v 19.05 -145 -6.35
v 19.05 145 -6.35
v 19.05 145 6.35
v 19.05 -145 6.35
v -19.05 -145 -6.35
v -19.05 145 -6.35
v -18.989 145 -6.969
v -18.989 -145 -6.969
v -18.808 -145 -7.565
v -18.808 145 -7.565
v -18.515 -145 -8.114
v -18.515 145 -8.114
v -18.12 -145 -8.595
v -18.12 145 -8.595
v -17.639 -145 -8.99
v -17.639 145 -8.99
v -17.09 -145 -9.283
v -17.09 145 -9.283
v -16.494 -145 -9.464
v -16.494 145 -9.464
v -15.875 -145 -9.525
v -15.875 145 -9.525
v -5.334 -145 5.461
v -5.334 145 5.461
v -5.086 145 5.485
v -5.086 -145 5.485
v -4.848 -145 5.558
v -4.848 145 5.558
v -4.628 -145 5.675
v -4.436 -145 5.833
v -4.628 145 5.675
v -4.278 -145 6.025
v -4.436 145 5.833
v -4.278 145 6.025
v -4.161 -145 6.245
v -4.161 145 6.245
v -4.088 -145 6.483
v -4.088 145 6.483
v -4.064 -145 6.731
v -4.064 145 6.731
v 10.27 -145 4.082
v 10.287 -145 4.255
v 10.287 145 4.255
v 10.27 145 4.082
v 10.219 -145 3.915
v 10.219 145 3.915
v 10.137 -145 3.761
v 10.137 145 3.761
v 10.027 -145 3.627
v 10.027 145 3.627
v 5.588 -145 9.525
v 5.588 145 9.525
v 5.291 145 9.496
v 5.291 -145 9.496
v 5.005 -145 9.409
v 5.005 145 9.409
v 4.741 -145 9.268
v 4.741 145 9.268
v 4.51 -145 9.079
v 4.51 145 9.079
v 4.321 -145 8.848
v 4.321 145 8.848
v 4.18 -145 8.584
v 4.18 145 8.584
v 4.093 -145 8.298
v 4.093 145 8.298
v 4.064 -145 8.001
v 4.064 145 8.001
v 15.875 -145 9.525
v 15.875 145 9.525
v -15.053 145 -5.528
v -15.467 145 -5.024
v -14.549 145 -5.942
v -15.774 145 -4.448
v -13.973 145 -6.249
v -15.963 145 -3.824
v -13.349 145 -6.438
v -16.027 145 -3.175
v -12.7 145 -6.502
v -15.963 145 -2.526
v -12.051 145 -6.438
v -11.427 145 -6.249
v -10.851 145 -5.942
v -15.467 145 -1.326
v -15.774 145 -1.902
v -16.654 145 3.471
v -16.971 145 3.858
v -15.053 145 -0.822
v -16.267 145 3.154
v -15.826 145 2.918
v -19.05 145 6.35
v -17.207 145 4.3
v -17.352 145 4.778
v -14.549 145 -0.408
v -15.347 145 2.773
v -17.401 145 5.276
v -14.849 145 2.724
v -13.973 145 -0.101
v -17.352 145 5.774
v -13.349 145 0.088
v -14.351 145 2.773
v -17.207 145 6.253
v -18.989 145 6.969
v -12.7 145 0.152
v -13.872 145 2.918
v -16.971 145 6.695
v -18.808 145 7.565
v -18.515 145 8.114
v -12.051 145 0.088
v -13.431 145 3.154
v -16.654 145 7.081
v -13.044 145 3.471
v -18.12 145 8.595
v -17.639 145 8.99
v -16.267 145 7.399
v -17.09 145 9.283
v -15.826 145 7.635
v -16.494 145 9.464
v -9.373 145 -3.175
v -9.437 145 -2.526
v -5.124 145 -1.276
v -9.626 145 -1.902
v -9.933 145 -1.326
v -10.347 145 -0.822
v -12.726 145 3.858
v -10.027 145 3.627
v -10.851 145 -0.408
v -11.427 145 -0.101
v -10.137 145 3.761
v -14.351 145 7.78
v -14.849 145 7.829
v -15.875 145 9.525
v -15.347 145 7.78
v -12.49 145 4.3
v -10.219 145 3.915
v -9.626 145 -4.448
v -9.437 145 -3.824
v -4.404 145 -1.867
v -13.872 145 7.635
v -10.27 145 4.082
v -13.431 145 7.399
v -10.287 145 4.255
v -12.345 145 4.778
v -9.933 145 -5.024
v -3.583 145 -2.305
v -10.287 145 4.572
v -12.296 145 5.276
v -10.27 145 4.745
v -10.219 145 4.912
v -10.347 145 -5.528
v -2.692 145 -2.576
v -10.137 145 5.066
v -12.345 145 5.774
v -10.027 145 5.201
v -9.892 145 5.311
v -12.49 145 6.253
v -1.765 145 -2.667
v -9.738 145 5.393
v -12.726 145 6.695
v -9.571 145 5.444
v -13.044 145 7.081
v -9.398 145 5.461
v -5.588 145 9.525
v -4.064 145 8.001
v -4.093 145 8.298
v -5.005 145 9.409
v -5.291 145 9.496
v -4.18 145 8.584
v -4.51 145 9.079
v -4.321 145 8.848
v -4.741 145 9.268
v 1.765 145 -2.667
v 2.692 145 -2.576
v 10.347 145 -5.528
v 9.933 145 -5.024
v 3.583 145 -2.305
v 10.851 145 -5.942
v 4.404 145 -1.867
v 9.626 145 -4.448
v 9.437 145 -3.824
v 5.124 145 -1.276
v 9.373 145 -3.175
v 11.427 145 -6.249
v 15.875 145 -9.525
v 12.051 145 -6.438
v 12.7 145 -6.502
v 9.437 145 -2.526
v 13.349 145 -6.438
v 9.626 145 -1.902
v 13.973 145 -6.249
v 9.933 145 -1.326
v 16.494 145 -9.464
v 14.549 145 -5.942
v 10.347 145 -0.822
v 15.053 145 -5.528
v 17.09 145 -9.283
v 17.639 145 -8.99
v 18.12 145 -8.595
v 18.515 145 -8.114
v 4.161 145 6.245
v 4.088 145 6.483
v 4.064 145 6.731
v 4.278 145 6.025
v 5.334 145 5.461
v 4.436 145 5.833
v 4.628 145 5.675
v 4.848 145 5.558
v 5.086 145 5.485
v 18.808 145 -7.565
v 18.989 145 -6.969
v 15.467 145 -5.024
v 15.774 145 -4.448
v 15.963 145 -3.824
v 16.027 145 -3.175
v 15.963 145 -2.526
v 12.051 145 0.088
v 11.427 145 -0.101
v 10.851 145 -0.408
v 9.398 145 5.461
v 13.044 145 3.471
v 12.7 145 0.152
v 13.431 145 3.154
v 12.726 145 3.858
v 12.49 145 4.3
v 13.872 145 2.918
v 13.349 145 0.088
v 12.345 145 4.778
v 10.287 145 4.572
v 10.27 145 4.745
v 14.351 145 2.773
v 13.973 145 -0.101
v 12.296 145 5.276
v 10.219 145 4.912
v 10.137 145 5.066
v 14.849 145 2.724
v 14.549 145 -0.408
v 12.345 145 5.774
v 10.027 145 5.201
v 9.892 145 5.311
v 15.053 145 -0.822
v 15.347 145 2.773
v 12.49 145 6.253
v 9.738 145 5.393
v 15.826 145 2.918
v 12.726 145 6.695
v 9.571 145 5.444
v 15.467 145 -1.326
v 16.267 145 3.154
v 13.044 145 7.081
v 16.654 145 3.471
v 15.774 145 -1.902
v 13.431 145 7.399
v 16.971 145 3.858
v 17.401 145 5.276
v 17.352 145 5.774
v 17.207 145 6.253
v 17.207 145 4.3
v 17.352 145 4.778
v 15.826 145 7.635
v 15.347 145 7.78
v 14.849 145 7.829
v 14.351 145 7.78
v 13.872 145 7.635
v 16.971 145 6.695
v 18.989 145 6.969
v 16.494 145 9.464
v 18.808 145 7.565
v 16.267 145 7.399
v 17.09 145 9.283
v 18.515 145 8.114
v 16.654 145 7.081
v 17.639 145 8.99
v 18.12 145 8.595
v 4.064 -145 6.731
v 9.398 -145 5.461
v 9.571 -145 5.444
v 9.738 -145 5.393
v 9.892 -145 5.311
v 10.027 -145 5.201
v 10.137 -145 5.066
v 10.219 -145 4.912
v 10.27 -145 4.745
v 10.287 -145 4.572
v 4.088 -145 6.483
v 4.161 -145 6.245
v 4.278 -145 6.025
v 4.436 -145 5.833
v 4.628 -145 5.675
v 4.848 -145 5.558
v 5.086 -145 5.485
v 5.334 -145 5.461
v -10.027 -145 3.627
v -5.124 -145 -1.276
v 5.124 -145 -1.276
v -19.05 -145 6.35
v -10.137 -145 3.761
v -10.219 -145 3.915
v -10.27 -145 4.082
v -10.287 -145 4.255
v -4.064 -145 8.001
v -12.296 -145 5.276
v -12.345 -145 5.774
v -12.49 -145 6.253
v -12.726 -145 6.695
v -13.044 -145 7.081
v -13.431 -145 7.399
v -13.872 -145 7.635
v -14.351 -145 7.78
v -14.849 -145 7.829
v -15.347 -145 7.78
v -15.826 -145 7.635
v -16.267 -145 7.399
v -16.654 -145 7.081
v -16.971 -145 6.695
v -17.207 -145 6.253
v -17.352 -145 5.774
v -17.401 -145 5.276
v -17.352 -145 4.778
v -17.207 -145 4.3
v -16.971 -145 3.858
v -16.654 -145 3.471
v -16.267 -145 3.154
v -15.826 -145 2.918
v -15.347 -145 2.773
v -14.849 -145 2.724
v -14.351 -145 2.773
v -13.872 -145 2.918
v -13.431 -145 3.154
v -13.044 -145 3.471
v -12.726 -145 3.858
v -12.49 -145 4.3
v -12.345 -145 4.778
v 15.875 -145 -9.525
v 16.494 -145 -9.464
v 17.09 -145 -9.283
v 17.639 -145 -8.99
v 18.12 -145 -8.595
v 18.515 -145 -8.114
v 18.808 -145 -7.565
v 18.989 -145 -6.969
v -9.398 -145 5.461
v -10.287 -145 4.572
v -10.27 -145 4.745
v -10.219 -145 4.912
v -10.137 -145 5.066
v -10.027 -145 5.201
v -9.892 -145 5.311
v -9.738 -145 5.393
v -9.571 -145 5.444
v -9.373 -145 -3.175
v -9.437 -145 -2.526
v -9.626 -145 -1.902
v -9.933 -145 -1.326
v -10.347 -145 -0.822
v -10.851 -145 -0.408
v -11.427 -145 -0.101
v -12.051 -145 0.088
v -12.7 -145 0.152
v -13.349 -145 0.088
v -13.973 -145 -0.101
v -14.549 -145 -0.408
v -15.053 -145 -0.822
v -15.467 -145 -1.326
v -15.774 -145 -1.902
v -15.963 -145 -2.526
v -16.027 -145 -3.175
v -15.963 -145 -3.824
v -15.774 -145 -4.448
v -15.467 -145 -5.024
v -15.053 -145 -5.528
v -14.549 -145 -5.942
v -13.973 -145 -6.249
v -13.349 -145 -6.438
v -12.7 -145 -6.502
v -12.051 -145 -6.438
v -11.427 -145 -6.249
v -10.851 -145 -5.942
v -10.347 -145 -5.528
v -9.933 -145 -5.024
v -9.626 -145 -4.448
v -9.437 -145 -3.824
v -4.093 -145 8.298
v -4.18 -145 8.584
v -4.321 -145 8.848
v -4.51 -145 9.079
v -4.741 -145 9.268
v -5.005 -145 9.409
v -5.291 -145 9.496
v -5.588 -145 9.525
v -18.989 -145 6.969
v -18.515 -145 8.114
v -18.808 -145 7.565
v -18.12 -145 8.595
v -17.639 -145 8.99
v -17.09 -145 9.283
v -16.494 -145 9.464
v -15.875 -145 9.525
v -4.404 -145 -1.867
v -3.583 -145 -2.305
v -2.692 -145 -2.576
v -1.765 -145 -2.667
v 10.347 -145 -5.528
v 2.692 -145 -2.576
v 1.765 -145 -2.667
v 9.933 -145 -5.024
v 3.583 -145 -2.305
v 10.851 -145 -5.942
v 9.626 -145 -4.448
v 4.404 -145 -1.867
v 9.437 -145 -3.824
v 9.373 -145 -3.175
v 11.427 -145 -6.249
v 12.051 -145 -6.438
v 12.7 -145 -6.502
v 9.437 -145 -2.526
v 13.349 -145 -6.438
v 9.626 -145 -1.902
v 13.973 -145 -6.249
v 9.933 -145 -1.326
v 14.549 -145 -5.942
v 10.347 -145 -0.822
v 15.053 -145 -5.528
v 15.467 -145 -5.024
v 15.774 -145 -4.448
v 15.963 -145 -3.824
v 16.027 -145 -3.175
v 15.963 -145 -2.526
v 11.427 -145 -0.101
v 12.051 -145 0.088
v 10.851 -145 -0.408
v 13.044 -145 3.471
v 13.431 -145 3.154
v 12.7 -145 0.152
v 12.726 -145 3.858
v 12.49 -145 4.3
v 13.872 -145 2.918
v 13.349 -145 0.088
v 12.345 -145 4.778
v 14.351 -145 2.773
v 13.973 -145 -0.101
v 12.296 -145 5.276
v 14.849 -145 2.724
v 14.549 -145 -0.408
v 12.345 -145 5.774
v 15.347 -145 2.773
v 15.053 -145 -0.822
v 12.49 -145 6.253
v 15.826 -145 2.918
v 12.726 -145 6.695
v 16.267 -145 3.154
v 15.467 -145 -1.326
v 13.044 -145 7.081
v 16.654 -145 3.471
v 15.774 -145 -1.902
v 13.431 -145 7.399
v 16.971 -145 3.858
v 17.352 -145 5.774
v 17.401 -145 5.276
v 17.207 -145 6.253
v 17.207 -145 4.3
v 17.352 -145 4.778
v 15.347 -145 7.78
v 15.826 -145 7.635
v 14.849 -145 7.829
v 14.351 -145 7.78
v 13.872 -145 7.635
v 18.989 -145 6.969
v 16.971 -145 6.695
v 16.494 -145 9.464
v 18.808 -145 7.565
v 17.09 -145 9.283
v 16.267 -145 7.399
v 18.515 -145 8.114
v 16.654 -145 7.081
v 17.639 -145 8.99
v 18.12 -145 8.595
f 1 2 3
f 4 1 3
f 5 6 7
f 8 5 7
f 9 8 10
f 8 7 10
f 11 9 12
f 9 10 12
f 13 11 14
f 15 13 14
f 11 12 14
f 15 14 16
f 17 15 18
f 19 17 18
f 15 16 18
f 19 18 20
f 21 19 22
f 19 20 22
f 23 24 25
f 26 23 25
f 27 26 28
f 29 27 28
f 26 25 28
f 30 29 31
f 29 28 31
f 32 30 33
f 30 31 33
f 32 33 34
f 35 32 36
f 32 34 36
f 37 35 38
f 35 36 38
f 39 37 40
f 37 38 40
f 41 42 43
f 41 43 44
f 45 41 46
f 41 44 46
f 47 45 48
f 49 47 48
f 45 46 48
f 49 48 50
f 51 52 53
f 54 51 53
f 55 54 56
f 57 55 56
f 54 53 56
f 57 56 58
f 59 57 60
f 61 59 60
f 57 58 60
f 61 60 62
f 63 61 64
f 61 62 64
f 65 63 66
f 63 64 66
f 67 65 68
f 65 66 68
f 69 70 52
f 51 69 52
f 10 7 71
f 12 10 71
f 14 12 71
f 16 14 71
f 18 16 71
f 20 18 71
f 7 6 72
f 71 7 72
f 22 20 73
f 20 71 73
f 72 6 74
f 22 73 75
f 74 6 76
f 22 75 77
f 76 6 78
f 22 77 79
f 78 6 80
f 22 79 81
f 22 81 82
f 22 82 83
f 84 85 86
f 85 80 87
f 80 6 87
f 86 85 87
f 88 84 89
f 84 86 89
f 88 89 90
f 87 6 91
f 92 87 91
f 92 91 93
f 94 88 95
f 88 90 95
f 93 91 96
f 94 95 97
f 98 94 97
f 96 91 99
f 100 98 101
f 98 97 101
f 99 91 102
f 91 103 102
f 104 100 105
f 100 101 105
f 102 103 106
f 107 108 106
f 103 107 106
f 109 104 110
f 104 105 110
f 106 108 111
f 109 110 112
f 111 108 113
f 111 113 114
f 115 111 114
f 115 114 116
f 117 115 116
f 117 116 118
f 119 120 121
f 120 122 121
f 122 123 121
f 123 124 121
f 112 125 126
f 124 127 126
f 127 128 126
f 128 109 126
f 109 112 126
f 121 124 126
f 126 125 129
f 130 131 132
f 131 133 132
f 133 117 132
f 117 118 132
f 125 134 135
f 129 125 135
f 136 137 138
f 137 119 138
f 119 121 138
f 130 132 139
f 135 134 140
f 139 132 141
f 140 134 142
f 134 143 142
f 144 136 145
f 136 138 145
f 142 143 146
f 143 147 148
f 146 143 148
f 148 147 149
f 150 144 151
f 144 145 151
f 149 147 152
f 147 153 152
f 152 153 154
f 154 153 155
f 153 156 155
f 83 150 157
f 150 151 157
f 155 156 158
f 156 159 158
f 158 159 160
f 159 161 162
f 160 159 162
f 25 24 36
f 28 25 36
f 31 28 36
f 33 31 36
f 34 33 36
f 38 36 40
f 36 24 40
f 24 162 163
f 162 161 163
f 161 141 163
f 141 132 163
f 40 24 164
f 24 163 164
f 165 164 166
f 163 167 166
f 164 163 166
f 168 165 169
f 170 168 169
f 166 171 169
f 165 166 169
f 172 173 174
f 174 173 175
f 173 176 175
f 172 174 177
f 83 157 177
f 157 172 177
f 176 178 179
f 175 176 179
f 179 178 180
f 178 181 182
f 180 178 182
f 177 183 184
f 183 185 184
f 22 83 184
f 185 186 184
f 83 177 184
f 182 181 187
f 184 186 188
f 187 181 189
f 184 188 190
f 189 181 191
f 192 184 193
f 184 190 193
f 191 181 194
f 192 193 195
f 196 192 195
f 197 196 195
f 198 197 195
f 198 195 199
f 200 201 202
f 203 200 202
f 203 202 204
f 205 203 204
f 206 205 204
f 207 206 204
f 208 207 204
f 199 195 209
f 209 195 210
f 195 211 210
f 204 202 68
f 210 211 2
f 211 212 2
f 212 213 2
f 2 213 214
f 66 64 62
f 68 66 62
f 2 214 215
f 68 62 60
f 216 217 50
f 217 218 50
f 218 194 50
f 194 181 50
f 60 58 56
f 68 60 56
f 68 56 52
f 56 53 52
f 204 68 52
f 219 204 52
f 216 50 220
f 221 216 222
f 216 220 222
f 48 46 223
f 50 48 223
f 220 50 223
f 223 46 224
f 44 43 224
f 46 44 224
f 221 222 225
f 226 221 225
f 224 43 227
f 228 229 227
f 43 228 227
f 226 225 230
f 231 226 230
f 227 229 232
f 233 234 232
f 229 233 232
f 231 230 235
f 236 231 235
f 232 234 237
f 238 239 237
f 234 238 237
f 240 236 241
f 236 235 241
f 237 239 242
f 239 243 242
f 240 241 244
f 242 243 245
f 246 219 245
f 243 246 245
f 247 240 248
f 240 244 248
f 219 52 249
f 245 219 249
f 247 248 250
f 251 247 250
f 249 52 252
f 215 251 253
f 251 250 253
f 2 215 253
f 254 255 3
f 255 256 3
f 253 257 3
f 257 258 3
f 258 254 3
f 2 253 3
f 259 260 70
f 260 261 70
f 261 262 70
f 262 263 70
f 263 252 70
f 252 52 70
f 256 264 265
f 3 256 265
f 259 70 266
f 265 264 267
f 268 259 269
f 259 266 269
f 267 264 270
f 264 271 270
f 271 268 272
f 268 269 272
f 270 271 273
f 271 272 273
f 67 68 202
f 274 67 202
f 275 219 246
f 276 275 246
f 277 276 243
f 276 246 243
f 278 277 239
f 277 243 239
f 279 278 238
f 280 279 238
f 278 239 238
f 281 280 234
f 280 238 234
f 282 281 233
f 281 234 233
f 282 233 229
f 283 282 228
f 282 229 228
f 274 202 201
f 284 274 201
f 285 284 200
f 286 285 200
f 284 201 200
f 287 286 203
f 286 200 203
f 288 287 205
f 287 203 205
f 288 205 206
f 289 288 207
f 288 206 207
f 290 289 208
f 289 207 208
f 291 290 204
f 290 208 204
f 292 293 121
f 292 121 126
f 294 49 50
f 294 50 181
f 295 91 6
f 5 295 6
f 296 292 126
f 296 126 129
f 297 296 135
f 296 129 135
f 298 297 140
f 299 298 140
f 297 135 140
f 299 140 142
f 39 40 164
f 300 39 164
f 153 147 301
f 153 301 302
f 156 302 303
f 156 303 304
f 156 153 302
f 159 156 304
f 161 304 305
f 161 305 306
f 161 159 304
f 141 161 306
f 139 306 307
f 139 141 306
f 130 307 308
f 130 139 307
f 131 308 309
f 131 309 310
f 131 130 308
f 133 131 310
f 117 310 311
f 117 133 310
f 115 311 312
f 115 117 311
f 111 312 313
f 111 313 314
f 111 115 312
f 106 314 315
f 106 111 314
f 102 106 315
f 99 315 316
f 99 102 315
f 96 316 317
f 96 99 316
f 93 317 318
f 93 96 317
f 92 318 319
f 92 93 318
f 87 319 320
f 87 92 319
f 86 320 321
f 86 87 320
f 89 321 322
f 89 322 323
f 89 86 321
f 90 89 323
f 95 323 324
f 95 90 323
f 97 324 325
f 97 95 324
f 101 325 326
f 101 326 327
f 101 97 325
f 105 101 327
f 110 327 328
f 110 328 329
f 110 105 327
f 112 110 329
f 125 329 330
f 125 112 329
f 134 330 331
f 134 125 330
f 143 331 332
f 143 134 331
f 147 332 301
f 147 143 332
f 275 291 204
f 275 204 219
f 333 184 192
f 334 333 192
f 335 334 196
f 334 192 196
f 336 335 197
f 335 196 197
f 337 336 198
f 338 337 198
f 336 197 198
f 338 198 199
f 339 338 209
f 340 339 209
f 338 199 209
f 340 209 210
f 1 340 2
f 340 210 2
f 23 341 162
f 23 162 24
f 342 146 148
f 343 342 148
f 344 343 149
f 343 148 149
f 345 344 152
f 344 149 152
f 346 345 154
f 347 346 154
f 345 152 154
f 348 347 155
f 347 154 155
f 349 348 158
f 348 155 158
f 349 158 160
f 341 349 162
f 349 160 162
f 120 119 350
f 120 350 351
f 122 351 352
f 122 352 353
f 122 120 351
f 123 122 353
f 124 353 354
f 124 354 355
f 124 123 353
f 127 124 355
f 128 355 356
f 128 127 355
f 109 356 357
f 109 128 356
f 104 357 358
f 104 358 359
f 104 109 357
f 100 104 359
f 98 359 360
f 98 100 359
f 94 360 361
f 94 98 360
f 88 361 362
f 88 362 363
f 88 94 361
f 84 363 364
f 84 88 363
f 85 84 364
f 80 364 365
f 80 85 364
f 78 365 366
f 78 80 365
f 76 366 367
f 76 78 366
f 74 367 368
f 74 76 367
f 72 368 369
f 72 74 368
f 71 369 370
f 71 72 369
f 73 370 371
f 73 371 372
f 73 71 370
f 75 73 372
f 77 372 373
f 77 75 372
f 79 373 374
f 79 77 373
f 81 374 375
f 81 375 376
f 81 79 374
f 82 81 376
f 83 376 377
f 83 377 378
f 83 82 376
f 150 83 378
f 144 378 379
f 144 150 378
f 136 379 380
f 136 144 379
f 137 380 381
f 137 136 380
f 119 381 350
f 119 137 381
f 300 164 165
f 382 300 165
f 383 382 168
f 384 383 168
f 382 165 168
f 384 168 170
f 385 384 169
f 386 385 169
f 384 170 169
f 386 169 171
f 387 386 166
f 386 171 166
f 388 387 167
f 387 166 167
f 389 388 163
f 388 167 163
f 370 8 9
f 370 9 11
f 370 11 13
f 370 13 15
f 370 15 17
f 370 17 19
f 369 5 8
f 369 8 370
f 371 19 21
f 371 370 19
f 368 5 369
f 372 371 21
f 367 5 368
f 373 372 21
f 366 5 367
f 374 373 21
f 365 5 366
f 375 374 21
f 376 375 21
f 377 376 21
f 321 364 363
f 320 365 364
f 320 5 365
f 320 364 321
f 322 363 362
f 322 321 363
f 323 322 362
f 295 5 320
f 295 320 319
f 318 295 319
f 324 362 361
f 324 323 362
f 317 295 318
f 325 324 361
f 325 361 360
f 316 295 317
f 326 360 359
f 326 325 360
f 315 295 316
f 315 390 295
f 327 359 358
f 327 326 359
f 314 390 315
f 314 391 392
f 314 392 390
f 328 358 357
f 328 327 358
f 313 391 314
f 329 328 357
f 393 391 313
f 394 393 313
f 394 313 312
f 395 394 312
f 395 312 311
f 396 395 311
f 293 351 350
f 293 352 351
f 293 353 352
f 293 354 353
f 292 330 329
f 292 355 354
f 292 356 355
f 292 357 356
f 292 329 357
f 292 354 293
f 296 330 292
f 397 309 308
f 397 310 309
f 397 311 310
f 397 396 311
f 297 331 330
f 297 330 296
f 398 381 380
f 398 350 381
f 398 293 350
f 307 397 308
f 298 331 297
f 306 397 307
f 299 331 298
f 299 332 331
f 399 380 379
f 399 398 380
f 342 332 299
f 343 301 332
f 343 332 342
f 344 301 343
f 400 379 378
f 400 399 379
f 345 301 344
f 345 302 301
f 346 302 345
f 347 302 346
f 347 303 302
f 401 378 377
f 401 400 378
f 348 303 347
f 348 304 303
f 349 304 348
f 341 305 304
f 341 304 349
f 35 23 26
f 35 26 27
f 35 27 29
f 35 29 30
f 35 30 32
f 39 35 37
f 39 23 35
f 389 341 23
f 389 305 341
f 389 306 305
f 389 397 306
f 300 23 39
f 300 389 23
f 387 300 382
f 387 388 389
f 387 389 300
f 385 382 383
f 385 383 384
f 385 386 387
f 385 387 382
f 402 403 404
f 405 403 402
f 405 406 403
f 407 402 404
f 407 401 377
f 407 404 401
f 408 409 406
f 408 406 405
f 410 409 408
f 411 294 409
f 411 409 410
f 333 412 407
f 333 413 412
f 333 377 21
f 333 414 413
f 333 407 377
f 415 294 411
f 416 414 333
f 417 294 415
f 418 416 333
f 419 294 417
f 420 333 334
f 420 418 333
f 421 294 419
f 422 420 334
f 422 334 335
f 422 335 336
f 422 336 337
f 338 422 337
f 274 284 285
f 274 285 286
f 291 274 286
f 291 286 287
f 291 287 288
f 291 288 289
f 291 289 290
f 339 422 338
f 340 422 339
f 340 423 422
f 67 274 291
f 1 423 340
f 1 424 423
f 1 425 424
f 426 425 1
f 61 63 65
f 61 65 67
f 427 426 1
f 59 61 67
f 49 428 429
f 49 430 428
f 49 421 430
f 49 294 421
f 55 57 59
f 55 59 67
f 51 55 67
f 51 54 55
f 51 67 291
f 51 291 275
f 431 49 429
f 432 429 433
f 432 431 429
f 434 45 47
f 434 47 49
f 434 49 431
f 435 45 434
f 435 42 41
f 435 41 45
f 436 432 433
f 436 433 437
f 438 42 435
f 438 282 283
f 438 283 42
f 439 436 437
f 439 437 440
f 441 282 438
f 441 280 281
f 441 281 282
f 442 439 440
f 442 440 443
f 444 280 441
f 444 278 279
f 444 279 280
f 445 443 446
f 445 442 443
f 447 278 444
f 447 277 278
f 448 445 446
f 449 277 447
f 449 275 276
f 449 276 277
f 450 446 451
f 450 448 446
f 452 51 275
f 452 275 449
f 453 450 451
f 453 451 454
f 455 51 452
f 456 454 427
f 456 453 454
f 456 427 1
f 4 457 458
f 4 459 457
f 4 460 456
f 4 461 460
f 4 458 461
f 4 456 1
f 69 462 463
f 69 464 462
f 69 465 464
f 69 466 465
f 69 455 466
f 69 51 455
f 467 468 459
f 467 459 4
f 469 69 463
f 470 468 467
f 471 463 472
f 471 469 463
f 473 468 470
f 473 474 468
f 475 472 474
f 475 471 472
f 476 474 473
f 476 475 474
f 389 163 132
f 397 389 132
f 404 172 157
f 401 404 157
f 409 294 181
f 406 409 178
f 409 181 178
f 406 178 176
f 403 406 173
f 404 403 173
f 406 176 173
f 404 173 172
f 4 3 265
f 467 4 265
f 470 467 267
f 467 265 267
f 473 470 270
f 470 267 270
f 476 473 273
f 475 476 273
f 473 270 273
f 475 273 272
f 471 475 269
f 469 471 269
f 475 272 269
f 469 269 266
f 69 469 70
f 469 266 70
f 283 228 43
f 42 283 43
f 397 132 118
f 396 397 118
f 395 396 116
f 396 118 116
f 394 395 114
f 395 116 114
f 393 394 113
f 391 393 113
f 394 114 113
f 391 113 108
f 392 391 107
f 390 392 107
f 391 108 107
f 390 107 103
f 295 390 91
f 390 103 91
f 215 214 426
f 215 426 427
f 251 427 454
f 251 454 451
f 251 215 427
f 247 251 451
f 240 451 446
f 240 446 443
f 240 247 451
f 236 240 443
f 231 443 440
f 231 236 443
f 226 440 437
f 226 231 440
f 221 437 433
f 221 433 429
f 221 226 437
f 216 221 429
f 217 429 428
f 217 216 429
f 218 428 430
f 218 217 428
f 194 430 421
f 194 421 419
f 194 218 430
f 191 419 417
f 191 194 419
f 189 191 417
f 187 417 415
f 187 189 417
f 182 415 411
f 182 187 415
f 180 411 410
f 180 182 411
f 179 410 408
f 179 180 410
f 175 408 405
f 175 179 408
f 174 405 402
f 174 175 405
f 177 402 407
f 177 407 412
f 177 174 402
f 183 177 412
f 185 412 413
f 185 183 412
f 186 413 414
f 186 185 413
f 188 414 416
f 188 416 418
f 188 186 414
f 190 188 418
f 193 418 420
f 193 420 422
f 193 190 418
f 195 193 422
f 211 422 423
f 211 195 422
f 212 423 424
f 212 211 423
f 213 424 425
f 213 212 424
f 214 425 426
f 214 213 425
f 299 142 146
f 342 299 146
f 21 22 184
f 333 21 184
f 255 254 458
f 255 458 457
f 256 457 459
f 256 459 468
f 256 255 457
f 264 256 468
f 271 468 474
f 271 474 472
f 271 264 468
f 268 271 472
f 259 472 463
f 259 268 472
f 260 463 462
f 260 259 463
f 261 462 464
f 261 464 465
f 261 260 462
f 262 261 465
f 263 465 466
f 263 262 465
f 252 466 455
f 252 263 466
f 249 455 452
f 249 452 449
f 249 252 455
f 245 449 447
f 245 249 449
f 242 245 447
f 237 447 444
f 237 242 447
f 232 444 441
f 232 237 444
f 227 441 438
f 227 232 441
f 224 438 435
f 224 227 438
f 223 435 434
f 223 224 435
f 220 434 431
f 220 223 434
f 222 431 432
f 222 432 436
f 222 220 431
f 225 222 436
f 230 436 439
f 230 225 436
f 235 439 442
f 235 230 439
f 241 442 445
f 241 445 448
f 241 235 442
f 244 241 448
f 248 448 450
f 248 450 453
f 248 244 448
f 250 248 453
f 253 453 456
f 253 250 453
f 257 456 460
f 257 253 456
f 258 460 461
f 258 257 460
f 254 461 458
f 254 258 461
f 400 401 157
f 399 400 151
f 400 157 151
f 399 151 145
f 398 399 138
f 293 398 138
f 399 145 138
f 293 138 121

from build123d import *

# Parameters (mm, degrees)
SKETCH16_R                = 3.3274
SKETCH16_R_2              = 2.5527
F_15_1575_PROFILE_1_DEPTH = 290


with BuildPart() as part:
    # Sketch16 → 15 1575 PROFILE(1) (new body)
    with BuildSketch(Plane.XZ.offset(-145)):
        with BuildLine():
            Line((-9.398, 5.461), (-5.334, 5.461))
            ThreePointArc((-5.334, 5.461), (-4.435974388, 5.832974388), (-4.064, 6.731))
            Line((-4.064, 6.731), (-4.064, 8.001))
            ThreePointArc((-4.064, 8.001), (-4.510369265, 9.078630735), (-5.588, 9.525))
            Line((-5.588, 9.525), (-15.875, 9.525))
            ThreePointArc((-15.875, 9.525), (-18.12006403, 8.59506403), (-19.05, 6.35))
            Line((-19.05, 6.35), (-19.05, -6.35))
            ThreePointArc((-19.05, -6.35), (-18.12006403, -8.59506403), (-15.875, -9.525))
            Line((-15.875, -9.525), (15.875, -9.525))
            ThreePointArc((15.875, -9.525), (18.12006403, -8.59506403), (19.05, -6.35))
            Line((19.05, -6.35), (19.05, 6.35))
            ThreePointArc((19.05, 6.35), (18.12006403, 8.59506403), (15.875, 9.525))
            Line((15.875, 9.525), (5.588, 9.525))
            ThreePointArc((5.588, 9.525), (4.510369265, 9.078630735), (4.064, 8.001))
            Line((4.064, 8.001), (4.064, 6.731))
            ThreePointArc((4.064, 6.731), (4.435974388, 5.832974388), (5.334, 5.461))
            Line((5.334, 5.461), (9.398, 5.461))
            ThreePointArc((9.398, 5.461), (10.026617928, 5.200617928), (10.287, 4.572))
            Line((10.287, 4.572), (10.287, 4.255364987))
            ThreePointArc((10.287, 4.255364987), (10.219328904, 3.915159416), (10.026617928, 3.626747059))
            Line((10.026617928, 3.626747059), (5.124055081, -1.275815789))
            ThreePointArc((5.124055081, -1.275815789), (3.583109058, -2.305443004), (1.765439291, -2.667))
            Line((1.765439291, -2.667), (-1.765439291, -2.667))
            ThreePointArc((-1.765439291, -2.667), (-3.583109058, -2.305443004), (-5.124055081, -1.275815789))
            Line((-5.124055081, -1.275815789), (-10.026617928, 3.626747059))
            ThreePointArc((-10.026617928, 3.626747059), (-10.219328904, 3.915159416), (-10.287, 4.255364987))
            Line((-10.287, 4.255364987), (-10.287, 4.572))
            ThreePointArc((-10.287, 4.572), (-10.026617928, 5.200617928), (-9.398, 5.461))
        make_face()
        with Locations((-12.7, -3.175)):
            Circle(SKETCH16_R, mode=Mode.SUBTRACT)
        with Locations((-14.848796959, 5.276432773)):
            Circle(SKETCH16_R_2, mode=Mode.SUBTRACT)
        with Locations((12.7, -3.175)):
            Circle(SKETCH16_R, mode=Mode.SUBTRACT)
        with Locations((14.848796959, 5.276432773)):
            Circle(SKETCH16_R_2, mode=Mode.SUBTRACT)
    extrude(amount=F_15_1575_PROFILE_1_DEPTH)


solid = part.part
